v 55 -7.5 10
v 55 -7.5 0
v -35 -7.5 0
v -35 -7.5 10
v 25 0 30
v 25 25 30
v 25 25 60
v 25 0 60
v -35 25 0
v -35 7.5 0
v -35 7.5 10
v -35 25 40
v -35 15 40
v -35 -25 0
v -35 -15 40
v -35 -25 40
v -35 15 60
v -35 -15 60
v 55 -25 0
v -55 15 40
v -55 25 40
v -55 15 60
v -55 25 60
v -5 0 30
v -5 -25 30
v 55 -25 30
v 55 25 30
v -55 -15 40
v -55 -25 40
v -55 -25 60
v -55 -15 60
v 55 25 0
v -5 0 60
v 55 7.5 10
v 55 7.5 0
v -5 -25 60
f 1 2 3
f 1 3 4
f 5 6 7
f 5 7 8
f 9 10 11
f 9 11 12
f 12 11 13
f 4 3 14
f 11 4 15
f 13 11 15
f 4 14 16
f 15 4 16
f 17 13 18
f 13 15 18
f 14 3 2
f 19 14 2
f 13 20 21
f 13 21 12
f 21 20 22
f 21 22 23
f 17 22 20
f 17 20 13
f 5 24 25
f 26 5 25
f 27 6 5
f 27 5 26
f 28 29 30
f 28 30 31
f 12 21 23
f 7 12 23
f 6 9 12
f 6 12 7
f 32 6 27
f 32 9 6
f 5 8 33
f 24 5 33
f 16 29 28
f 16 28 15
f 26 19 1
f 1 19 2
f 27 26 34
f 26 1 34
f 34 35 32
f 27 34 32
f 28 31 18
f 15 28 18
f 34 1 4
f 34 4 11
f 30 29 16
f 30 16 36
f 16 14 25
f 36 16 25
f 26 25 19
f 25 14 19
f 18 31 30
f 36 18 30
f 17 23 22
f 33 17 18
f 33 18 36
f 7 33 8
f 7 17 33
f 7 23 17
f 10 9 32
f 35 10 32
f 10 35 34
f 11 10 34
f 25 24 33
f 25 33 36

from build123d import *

# Parameters (mm, degrees)
F0_W     = 110
F0_H     = 50
F1_DEPTH = 60
F2_W     = 15
F2_H     = 20
F3_DEPTH = 110.001
F5_DEPTH = 30
F6_W     = 20
F6_H     = 40
F7_DEPTH = 50.001
F8_W     = 20
F8_H     = 30
F9_DEPTH = 60.001


with BuildPart() as f1:
    # F0 (on Top) → F1 (new body)
    with BuildSketch(Plane.XY):
        Rectangle(F0_W, F0_H)
    extrude(amount=F1_DEPTH)

    # F2 (on face) → F3 (cut, through all)
    with BuildSketch(Plane.YZ.offset(55)):
        Rectangle(F2_W, F2_H)
    extrude(amount=-F3_DEPTH, mode=Mode.SUBTRACT)

    # F4 (on face) → F5 (cut)
    with BuildSketch(Plane.XY.offset(60)):
        Polygon((55, 25), (25, 25), (25, 0), (-5, 0), (-5, -25), (55, -25), align=None)
    extrude(amount=-F5_DEPTH, mode=Mode.SUBTRACT)

    # F6 (on face) → F7 (cut, through all)
    with BuildSketch(Plane.XZ.offset(25)):
        with Locations((-45, 20)):
            Rectangle(F6_W, F6_H)
    extrude(amount=-F7_DEPTH, mode=Mode.SUBTRACT)

    # F8 (on face) → F9 (cut, through all)
    with BuildSketch(Plane.XY.offset(60)):
        with Locations((-45, 0)):
            Rectangle(F8_W, F8_H)
    extrude(amount=-F9_DEPTH, mode=Mode.SUBTRACT)


solid = f1.part
